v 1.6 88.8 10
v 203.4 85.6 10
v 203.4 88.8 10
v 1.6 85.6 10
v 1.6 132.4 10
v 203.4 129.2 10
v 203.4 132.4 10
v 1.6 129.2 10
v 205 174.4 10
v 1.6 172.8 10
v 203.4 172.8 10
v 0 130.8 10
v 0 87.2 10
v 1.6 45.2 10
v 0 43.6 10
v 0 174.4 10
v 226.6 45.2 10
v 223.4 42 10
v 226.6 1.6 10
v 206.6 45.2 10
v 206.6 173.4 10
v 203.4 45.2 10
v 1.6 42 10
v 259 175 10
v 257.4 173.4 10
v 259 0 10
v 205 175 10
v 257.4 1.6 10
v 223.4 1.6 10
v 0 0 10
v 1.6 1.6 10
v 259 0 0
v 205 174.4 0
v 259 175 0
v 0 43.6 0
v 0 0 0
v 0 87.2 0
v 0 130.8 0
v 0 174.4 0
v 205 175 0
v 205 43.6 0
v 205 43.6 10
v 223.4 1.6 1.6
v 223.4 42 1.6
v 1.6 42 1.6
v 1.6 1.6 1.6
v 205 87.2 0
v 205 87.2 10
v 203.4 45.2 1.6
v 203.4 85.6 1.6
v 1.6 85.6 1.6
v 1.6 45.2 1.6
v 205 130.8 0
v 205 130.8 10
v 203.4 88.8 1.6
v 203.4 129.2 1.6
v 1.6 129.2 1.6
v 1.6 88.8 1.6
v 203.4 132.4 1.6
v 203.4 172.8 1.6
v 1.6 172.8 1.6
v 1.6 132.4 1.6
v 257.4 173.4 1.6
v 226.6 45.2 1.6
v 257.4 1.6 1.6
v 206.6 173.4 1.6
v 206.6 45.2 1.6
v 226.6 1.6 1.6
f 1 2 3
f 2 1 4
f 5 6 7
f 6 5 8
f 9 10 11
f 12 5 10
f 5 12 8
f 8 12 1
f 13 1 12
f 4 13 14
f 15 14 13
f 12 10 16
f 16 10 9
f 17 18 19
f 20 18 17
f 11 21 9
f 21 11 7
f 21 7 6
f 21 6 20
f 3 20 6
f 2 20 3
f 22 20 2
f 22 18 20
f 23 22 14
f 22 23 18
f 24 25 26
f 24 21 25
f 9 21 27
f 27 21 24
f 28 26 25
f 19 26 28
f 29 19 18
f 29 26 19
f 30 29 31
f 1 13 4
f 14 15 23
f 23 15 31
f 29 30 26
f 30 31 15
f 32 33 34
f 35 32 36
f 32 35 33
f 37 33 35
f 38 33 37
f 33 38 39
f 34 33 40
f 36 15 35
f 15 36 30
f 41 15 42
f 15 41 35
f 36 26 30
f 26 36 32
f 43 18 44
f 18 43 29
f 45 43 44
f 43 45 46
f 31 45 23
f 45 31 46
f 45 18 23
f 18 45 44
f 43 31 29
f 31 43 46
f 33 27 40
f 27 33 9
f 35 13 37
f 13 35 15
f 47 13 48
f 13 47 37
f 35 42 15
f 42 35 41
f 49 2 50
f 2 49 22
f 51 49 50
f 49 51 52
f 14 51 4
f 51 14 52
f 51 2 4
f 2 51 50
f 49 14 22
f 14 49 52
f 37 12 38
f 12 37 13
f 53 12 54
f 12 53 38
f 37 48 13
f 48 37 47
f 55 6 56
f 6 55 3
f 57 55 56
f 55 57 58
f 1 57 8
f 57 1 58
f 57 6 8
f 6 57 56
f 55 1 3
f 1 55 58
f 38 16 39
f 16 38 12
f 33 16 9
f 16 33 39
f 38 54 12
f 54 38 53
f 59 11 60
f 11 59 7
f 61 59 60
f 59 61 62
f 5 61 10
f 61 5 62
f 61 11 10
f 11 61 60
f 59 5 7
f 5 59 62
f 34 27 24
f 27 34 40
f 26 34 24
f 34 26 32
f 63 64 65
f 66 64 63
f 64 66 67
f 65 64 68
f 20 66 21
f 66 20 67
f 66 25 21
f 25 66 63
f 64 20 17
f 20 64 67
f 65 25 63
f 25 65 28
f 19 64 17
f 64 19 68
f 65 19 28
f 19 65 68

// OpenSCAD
m_width=259;   // major width
m_depth=175;   // major depth
p_line_w=0.4; // print line width
p_line_h=0.22; // print line height

wall=4*p_line_w;
wall_height=10;

c_buffer=5;
c_knife=220+c_buffer;
c_fork=200+c_buffer;
c_small=150+c_buffer;
c_width=floor(m_depth/4/p_line_w)*p_line_w;

/*
# Notes
Full space is 259w, 175deep.
Use a hollow octagon fitting into a circle for a press fit.
Knives: 220 long
Forks, spoons: 200 long
Small forks, spoons: 150 long
*/

/* %base(); */
knife_tray();
translate([0,c_width]) fork_tray();
translate([0,c_width*2]) spoon_tray();
translate([0,c_width*3]) smalls_tray();
translate([c_fork,0]) gap_tray();  // TODO

// grid
/* for (i = [0:2], j = [0:1]) { */
/*   if (i%2==j%2) { */
/*     translate([120*i,120*j,20]) square([120,120]); */
/*   } */
/* } */

module box(w,d) {
  difference() {
    cube([w,d,wall_height]);
    translate([wall,wall,wall]) cube([w-2*wall,d-2*wall,wall_height]);
  }
}

module base() {
  cube([m_width,m_depth,1]);
}

module knife_tray() {
  box(c_knife,c_width);
}

module fork_tray() {
  box(c_fork,c_width);
}

module spoon_tray() {
  fork_tray();
}

module smalls_tray() {
  fork_tray();
  // box(c_small,c_width);
}

module gap_tray() {
  shape=[
    [[0,c_width],        [c_knife-c_fork+1,m_depth-c_width,wall_height]],
    [[c_knife-c_fork,0], [m_width-c_knife,m_depth,wall_height]]
  ];
  difference() {
    for (i=shape) translate([i[0][0],i[0][1]]) cube([i[1][0],i[1][1],i[1][2]]);
    union() {
      translate([shape[0][0][0]+wall,shape[0][0][1]+wall,wall])
        cube([shape[0][1][0],shape[0][1][1]-2*wall,shape[1][1][2]]);
      translate([shape[1][0][0]+wall,shape[1][0][1]+wall,wall])
        cube([shape[1][1][0]-2*wall,shape[1][1][1]-2*wall,shape[1][1][2]]);
    }
  }
}
